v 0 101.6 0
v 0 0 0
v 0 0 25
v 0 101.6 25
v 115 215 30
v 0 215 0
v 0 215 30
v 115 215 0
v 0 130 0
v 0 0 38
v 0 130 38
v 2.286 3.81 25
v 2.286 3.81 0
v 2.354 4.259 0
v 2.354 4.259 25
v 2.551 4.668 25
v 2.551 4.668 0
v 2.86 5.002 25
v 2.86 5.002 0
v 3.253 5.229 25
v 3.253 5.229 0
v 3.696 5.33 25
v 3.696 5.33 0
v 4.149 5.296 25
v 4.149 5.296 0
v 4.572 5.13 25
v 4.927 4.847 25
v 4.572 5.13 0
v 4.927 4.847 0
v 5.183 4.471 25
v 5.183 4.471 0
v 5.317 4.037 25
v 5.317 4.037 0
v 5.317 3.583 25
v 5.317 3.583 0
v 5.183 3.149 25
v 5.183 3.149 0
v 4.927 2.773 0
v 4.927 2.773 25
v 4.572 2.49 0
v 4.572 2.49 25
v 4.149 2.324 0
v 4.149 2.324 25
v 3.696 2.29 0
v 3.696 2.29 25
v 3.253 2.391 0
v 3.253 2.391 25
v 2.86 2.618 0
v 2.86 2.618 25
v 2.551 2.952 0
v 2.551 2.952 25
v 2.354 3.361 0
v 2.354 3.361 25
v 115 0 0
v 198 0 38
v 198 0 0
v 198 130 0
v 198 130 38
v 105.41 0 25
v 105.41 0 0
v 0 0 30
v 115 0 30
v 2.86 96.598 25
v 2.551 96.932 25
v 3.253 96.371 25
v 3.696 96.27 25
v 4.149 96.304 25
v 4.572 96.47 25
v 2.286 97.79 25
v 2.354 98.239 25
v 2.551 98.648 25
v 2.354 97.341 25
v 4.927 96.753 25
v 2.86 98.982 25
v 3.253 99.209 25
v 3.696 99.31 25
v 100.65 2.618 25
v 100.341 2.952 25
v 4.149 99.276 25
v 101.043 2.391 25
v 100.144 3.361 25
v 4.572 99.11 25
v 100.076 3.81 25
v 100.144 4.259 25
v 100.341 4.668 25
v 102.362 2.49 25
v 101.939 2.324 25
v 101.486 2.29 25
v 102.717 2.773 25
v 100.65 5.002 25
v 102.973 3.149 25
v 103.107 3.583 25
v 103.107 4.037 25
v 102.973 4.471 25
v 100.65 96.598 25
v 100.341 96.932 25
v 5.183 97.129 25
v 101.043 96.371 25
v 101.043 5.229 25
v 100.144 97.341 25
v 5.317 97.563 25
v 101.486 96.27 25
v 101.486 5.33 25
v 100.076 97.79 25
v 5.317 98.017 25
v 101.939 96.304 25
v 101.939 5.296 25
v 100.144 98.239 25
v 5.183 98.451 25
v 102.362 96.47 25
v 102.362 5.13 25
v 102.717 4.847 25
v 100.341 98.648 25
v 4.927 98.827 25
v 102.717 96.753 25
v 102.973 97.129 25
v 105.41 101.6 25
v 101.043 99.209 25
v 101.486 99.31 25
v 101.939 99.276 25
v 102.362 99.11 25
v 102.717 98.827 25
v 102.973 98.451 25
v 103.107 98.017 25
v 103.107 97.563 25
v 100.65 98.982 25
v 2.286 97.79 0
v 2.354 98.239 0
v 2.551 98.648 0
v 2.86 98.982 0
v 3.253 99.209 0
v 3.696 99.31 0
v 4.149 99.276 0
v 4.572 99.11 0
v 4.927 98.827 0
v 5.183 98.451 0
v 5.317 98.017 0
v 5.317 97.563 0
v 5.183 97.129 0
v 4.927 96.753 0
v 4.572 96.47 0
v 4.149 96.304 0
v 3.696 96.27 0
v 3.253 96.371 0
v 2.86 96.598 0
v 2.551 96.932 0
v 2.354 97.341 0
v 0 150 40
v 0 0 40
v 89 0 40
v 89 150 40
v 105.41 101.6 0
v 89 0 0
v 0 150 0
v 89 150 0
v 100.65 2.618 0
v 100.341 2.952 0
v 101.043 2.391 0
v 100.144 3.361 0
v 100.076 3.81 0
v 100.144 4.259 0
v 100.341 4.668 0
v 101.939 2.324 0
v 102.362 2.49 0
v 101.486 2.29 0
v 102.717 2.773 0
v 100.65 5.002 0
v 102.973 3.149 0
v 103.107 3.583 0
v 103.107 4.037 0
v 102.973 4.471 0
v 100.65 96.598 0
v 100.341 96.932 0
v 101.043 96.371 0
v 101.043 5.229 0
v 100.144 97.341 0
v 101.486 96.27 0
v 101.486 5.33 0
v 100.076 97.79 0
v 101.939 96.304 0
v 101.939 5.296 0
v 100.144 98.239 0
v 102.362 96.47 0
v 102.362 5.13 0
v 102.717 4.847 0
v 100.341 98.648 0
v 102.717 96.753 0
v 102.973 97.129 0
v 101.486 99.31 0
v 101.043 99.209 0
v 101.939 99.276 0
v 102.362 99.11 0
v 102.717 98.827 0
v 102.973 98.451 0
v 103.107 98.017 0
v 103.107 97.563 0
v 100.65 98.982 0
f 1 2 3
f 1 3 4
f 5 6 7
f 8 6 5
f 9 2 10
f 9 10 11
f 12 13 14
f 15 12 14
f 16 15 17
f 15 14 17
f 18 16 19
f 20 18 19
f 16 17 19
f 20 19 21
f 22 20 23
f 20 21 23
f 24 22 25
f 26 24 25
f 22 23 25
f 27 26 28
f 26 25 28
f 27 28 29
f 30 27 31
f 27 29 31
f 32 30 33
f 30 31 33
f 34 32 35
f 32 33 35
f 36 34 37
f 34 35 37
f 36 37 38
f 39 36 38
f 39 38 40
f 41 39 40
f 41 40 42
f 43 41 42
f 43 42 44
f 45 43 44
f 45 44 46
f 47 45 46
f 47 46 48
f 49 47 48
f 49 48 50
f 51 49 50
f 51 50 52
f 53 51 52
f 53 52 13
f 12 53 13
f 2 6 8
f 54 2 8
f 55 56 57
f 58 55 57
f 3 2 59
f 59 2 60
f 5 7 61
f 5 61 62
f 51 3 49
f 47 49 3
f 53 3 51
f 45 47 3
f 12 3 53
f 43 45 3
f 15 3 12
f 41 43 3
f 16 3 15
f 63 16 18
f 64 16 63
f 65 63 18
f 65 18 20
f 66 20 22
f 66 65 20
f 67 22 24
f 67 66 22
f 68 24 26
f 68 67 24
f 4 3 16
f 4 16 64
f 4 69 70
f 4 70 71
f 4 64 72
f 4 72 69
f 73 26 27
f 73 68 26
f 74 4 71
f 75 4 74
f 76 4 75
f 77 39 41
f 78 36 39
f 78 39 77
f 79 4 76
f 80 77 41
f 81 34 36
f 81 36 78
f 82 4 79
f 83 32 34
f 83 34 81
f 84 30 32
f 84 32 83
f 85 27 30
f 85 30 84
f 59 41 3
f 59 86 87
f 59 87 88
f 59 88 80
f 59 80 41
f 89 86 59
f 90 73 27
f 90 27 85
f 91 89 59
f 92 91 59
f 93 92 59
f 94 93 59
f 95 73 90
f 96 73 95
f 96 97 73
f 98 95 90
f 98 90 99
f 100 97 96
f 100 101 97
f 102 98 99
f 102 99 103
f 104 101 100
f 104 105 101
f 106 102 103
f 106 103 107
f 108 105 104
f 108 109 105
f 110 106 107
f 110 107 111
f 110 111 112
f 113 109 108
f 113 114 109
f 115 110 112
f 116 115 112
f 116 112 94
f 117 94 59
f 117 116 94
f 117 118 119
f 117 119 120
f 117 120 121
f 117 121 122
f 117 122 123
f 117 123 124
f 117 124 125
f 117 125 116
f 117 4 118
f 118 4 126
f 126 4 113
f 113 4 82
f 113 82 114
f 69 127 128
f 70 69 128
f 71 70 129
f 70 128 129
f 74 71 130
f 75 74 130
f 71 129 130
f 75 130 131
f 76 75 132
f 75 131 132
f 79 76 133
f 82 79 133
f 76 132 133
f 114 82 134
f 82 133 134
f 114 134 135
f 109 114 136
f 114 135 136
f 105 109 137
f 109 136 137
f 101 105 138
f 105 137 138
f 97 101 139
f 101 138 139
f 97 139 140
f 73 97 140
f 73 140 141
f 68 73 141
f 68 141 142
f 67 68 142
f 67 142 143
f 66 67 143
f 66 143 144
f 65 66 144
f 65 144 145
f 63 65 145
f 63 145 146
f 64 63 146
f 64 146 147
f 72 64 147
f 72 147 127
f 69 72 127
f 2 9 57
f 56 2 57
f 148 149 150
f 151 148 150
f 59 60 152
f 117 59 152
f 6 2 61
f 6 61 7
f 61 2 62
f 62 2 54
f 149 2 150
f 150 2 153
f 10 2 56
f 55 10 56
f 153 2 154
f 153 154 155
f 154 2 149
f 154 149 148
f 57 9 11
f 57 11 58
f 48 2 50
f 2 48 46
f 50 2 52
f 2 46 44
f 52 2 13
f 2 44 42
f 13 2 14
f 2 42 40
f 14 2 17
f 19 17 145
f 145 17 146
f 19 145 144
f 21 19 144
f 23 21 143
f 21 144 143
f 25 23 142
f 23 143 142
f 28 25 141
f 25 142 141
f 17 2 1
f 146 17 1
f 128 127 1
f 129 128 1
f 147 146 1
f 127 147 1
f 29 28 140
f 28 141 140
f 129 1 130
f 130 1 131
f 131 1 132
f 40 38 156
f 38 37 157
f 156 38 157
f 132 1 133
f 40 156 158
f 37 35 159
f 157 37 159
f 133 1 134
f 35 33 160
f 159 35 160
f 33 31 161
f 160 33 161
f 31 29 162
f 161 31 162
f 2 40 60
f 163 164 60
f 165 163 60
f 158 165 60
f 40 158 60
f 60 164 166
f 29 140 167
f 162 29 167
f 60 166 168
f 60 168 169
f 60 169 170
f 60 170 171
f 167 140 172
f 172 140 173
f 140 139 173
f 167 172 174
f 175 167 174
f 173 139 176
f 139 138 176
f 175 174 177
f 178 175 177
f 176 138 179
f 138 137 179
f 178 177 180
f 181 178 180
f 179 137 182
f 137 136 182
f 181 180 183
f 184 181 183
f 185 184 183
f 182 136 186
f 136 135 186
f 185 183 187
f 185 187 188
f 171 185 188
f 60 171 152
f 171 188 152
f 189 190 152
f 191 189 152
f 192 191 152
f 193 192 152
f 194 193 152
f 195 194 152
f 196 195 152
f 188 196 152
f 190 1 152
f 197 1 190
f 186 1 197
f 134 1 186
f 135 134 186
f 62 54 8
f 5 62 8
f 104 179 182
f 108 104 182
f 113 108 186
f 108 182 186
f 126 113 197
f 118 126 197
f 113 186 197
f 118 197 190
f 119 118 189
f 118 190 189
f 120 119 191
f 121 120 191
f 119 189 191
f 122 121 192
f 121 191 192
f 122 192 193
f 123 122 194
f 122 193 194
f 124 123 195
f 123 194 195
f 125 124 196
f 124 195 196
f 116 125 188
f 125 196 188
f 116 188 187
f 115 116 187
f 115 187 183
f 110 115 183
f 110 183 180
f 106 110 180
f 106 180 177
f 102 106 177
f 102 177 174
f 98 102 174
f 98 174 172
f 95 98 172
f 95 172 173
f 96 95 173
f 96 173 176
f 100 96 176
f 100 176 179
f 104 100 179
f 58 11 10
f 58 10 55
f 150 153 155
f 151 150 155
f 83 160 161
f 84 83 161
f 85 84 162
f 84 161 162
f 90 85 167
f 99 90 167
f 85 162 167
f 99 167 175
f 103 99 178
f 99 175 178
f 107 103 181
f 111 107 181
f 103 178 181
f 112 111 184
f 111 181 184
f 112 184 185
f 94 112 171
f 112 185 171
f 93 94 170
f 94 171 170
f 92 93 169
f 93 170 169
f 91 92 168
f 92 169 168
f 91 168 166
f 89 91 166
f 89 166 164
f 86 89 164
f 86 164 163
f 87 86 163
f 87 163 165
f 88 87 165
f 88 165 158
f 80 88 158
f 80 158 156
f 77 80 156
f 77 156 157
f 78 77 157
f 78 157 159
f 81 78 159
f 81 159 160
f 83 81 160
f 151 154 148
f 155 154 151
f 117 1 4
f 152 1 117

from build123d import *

# Parameters (mm, degrees)
F0_W      = 105.41
F0_H      = 101.6
F1_DEPTH  = 25
F3_D      = 3.048
F4_D      = 3.048
F5_D      = 3.048
F6_D      = 3.048
F7_W      = 115
F7_H      = 215
F8_DEPTH  = 30
F9_W      = 198
F9_H      = 130
F10_DEPTH = 38
F11_W     = 89
F11_H     = 150
F12_DEPTH = 40


with BuildPart() as f1:
    # F0 (on Top) → F1 (new body)
    with BuildSketch(Plane.XY):
        with Locations((52.705, 50.8)):
            Rectangle(F0_W, F0_H)
    extrude(amount=F1_DEPTH)

    # F3 (through all)
    with Locations(Plane.XY.offset(25)):
        with Locations((3.81, 97.79)):
            Hole(F3_D / 2)

    # F4 (through all)
    with Locations(Plane.XY.offset(25)):
        with Locations((101.6, 97.79)):
            Hole(F4_D / 2)

    # F5 (through all)
    with Locations(Plane.XY.offset(25)):
        with Locations((3.81, 3.81)):
            Hole(F5_D / 2)

    # F6 (through all)
    with Locations(Plane.XY.offset(25)):
        with Locations((101.6, 3.81)):
            Hole(F6_D / 2)


with BuildPart() as f8:
    # F7 (on Top) → F8 (new body)
    with BuildSketch(Plane.XY):
        with Locations((57.5, 107.5)):
            Rectangle(F7_W, F7_H)
    extrude(amount=F8_DEPTH)


with BuildPart() as f10:
    # F9 (on Top) → F10 (new body)
    with BuildSketch(Plane.XY):
        with Locations((99, 65)):
            Rectangle(F9_W, F9_H)
    extrude(amount=F10_DEPTH)


with BuildPart() as f12:
    # F11 (on Top) → F12 (new body)
    with BuildSketch(Plane.XY):
        with Locations((44.5, 75)):
            Rectangle(F11_W, F11_H)
    extrude(amount=F12_DEPTH)


solid = Compound([f1.part, f8.part, f10.part, f12.part])
